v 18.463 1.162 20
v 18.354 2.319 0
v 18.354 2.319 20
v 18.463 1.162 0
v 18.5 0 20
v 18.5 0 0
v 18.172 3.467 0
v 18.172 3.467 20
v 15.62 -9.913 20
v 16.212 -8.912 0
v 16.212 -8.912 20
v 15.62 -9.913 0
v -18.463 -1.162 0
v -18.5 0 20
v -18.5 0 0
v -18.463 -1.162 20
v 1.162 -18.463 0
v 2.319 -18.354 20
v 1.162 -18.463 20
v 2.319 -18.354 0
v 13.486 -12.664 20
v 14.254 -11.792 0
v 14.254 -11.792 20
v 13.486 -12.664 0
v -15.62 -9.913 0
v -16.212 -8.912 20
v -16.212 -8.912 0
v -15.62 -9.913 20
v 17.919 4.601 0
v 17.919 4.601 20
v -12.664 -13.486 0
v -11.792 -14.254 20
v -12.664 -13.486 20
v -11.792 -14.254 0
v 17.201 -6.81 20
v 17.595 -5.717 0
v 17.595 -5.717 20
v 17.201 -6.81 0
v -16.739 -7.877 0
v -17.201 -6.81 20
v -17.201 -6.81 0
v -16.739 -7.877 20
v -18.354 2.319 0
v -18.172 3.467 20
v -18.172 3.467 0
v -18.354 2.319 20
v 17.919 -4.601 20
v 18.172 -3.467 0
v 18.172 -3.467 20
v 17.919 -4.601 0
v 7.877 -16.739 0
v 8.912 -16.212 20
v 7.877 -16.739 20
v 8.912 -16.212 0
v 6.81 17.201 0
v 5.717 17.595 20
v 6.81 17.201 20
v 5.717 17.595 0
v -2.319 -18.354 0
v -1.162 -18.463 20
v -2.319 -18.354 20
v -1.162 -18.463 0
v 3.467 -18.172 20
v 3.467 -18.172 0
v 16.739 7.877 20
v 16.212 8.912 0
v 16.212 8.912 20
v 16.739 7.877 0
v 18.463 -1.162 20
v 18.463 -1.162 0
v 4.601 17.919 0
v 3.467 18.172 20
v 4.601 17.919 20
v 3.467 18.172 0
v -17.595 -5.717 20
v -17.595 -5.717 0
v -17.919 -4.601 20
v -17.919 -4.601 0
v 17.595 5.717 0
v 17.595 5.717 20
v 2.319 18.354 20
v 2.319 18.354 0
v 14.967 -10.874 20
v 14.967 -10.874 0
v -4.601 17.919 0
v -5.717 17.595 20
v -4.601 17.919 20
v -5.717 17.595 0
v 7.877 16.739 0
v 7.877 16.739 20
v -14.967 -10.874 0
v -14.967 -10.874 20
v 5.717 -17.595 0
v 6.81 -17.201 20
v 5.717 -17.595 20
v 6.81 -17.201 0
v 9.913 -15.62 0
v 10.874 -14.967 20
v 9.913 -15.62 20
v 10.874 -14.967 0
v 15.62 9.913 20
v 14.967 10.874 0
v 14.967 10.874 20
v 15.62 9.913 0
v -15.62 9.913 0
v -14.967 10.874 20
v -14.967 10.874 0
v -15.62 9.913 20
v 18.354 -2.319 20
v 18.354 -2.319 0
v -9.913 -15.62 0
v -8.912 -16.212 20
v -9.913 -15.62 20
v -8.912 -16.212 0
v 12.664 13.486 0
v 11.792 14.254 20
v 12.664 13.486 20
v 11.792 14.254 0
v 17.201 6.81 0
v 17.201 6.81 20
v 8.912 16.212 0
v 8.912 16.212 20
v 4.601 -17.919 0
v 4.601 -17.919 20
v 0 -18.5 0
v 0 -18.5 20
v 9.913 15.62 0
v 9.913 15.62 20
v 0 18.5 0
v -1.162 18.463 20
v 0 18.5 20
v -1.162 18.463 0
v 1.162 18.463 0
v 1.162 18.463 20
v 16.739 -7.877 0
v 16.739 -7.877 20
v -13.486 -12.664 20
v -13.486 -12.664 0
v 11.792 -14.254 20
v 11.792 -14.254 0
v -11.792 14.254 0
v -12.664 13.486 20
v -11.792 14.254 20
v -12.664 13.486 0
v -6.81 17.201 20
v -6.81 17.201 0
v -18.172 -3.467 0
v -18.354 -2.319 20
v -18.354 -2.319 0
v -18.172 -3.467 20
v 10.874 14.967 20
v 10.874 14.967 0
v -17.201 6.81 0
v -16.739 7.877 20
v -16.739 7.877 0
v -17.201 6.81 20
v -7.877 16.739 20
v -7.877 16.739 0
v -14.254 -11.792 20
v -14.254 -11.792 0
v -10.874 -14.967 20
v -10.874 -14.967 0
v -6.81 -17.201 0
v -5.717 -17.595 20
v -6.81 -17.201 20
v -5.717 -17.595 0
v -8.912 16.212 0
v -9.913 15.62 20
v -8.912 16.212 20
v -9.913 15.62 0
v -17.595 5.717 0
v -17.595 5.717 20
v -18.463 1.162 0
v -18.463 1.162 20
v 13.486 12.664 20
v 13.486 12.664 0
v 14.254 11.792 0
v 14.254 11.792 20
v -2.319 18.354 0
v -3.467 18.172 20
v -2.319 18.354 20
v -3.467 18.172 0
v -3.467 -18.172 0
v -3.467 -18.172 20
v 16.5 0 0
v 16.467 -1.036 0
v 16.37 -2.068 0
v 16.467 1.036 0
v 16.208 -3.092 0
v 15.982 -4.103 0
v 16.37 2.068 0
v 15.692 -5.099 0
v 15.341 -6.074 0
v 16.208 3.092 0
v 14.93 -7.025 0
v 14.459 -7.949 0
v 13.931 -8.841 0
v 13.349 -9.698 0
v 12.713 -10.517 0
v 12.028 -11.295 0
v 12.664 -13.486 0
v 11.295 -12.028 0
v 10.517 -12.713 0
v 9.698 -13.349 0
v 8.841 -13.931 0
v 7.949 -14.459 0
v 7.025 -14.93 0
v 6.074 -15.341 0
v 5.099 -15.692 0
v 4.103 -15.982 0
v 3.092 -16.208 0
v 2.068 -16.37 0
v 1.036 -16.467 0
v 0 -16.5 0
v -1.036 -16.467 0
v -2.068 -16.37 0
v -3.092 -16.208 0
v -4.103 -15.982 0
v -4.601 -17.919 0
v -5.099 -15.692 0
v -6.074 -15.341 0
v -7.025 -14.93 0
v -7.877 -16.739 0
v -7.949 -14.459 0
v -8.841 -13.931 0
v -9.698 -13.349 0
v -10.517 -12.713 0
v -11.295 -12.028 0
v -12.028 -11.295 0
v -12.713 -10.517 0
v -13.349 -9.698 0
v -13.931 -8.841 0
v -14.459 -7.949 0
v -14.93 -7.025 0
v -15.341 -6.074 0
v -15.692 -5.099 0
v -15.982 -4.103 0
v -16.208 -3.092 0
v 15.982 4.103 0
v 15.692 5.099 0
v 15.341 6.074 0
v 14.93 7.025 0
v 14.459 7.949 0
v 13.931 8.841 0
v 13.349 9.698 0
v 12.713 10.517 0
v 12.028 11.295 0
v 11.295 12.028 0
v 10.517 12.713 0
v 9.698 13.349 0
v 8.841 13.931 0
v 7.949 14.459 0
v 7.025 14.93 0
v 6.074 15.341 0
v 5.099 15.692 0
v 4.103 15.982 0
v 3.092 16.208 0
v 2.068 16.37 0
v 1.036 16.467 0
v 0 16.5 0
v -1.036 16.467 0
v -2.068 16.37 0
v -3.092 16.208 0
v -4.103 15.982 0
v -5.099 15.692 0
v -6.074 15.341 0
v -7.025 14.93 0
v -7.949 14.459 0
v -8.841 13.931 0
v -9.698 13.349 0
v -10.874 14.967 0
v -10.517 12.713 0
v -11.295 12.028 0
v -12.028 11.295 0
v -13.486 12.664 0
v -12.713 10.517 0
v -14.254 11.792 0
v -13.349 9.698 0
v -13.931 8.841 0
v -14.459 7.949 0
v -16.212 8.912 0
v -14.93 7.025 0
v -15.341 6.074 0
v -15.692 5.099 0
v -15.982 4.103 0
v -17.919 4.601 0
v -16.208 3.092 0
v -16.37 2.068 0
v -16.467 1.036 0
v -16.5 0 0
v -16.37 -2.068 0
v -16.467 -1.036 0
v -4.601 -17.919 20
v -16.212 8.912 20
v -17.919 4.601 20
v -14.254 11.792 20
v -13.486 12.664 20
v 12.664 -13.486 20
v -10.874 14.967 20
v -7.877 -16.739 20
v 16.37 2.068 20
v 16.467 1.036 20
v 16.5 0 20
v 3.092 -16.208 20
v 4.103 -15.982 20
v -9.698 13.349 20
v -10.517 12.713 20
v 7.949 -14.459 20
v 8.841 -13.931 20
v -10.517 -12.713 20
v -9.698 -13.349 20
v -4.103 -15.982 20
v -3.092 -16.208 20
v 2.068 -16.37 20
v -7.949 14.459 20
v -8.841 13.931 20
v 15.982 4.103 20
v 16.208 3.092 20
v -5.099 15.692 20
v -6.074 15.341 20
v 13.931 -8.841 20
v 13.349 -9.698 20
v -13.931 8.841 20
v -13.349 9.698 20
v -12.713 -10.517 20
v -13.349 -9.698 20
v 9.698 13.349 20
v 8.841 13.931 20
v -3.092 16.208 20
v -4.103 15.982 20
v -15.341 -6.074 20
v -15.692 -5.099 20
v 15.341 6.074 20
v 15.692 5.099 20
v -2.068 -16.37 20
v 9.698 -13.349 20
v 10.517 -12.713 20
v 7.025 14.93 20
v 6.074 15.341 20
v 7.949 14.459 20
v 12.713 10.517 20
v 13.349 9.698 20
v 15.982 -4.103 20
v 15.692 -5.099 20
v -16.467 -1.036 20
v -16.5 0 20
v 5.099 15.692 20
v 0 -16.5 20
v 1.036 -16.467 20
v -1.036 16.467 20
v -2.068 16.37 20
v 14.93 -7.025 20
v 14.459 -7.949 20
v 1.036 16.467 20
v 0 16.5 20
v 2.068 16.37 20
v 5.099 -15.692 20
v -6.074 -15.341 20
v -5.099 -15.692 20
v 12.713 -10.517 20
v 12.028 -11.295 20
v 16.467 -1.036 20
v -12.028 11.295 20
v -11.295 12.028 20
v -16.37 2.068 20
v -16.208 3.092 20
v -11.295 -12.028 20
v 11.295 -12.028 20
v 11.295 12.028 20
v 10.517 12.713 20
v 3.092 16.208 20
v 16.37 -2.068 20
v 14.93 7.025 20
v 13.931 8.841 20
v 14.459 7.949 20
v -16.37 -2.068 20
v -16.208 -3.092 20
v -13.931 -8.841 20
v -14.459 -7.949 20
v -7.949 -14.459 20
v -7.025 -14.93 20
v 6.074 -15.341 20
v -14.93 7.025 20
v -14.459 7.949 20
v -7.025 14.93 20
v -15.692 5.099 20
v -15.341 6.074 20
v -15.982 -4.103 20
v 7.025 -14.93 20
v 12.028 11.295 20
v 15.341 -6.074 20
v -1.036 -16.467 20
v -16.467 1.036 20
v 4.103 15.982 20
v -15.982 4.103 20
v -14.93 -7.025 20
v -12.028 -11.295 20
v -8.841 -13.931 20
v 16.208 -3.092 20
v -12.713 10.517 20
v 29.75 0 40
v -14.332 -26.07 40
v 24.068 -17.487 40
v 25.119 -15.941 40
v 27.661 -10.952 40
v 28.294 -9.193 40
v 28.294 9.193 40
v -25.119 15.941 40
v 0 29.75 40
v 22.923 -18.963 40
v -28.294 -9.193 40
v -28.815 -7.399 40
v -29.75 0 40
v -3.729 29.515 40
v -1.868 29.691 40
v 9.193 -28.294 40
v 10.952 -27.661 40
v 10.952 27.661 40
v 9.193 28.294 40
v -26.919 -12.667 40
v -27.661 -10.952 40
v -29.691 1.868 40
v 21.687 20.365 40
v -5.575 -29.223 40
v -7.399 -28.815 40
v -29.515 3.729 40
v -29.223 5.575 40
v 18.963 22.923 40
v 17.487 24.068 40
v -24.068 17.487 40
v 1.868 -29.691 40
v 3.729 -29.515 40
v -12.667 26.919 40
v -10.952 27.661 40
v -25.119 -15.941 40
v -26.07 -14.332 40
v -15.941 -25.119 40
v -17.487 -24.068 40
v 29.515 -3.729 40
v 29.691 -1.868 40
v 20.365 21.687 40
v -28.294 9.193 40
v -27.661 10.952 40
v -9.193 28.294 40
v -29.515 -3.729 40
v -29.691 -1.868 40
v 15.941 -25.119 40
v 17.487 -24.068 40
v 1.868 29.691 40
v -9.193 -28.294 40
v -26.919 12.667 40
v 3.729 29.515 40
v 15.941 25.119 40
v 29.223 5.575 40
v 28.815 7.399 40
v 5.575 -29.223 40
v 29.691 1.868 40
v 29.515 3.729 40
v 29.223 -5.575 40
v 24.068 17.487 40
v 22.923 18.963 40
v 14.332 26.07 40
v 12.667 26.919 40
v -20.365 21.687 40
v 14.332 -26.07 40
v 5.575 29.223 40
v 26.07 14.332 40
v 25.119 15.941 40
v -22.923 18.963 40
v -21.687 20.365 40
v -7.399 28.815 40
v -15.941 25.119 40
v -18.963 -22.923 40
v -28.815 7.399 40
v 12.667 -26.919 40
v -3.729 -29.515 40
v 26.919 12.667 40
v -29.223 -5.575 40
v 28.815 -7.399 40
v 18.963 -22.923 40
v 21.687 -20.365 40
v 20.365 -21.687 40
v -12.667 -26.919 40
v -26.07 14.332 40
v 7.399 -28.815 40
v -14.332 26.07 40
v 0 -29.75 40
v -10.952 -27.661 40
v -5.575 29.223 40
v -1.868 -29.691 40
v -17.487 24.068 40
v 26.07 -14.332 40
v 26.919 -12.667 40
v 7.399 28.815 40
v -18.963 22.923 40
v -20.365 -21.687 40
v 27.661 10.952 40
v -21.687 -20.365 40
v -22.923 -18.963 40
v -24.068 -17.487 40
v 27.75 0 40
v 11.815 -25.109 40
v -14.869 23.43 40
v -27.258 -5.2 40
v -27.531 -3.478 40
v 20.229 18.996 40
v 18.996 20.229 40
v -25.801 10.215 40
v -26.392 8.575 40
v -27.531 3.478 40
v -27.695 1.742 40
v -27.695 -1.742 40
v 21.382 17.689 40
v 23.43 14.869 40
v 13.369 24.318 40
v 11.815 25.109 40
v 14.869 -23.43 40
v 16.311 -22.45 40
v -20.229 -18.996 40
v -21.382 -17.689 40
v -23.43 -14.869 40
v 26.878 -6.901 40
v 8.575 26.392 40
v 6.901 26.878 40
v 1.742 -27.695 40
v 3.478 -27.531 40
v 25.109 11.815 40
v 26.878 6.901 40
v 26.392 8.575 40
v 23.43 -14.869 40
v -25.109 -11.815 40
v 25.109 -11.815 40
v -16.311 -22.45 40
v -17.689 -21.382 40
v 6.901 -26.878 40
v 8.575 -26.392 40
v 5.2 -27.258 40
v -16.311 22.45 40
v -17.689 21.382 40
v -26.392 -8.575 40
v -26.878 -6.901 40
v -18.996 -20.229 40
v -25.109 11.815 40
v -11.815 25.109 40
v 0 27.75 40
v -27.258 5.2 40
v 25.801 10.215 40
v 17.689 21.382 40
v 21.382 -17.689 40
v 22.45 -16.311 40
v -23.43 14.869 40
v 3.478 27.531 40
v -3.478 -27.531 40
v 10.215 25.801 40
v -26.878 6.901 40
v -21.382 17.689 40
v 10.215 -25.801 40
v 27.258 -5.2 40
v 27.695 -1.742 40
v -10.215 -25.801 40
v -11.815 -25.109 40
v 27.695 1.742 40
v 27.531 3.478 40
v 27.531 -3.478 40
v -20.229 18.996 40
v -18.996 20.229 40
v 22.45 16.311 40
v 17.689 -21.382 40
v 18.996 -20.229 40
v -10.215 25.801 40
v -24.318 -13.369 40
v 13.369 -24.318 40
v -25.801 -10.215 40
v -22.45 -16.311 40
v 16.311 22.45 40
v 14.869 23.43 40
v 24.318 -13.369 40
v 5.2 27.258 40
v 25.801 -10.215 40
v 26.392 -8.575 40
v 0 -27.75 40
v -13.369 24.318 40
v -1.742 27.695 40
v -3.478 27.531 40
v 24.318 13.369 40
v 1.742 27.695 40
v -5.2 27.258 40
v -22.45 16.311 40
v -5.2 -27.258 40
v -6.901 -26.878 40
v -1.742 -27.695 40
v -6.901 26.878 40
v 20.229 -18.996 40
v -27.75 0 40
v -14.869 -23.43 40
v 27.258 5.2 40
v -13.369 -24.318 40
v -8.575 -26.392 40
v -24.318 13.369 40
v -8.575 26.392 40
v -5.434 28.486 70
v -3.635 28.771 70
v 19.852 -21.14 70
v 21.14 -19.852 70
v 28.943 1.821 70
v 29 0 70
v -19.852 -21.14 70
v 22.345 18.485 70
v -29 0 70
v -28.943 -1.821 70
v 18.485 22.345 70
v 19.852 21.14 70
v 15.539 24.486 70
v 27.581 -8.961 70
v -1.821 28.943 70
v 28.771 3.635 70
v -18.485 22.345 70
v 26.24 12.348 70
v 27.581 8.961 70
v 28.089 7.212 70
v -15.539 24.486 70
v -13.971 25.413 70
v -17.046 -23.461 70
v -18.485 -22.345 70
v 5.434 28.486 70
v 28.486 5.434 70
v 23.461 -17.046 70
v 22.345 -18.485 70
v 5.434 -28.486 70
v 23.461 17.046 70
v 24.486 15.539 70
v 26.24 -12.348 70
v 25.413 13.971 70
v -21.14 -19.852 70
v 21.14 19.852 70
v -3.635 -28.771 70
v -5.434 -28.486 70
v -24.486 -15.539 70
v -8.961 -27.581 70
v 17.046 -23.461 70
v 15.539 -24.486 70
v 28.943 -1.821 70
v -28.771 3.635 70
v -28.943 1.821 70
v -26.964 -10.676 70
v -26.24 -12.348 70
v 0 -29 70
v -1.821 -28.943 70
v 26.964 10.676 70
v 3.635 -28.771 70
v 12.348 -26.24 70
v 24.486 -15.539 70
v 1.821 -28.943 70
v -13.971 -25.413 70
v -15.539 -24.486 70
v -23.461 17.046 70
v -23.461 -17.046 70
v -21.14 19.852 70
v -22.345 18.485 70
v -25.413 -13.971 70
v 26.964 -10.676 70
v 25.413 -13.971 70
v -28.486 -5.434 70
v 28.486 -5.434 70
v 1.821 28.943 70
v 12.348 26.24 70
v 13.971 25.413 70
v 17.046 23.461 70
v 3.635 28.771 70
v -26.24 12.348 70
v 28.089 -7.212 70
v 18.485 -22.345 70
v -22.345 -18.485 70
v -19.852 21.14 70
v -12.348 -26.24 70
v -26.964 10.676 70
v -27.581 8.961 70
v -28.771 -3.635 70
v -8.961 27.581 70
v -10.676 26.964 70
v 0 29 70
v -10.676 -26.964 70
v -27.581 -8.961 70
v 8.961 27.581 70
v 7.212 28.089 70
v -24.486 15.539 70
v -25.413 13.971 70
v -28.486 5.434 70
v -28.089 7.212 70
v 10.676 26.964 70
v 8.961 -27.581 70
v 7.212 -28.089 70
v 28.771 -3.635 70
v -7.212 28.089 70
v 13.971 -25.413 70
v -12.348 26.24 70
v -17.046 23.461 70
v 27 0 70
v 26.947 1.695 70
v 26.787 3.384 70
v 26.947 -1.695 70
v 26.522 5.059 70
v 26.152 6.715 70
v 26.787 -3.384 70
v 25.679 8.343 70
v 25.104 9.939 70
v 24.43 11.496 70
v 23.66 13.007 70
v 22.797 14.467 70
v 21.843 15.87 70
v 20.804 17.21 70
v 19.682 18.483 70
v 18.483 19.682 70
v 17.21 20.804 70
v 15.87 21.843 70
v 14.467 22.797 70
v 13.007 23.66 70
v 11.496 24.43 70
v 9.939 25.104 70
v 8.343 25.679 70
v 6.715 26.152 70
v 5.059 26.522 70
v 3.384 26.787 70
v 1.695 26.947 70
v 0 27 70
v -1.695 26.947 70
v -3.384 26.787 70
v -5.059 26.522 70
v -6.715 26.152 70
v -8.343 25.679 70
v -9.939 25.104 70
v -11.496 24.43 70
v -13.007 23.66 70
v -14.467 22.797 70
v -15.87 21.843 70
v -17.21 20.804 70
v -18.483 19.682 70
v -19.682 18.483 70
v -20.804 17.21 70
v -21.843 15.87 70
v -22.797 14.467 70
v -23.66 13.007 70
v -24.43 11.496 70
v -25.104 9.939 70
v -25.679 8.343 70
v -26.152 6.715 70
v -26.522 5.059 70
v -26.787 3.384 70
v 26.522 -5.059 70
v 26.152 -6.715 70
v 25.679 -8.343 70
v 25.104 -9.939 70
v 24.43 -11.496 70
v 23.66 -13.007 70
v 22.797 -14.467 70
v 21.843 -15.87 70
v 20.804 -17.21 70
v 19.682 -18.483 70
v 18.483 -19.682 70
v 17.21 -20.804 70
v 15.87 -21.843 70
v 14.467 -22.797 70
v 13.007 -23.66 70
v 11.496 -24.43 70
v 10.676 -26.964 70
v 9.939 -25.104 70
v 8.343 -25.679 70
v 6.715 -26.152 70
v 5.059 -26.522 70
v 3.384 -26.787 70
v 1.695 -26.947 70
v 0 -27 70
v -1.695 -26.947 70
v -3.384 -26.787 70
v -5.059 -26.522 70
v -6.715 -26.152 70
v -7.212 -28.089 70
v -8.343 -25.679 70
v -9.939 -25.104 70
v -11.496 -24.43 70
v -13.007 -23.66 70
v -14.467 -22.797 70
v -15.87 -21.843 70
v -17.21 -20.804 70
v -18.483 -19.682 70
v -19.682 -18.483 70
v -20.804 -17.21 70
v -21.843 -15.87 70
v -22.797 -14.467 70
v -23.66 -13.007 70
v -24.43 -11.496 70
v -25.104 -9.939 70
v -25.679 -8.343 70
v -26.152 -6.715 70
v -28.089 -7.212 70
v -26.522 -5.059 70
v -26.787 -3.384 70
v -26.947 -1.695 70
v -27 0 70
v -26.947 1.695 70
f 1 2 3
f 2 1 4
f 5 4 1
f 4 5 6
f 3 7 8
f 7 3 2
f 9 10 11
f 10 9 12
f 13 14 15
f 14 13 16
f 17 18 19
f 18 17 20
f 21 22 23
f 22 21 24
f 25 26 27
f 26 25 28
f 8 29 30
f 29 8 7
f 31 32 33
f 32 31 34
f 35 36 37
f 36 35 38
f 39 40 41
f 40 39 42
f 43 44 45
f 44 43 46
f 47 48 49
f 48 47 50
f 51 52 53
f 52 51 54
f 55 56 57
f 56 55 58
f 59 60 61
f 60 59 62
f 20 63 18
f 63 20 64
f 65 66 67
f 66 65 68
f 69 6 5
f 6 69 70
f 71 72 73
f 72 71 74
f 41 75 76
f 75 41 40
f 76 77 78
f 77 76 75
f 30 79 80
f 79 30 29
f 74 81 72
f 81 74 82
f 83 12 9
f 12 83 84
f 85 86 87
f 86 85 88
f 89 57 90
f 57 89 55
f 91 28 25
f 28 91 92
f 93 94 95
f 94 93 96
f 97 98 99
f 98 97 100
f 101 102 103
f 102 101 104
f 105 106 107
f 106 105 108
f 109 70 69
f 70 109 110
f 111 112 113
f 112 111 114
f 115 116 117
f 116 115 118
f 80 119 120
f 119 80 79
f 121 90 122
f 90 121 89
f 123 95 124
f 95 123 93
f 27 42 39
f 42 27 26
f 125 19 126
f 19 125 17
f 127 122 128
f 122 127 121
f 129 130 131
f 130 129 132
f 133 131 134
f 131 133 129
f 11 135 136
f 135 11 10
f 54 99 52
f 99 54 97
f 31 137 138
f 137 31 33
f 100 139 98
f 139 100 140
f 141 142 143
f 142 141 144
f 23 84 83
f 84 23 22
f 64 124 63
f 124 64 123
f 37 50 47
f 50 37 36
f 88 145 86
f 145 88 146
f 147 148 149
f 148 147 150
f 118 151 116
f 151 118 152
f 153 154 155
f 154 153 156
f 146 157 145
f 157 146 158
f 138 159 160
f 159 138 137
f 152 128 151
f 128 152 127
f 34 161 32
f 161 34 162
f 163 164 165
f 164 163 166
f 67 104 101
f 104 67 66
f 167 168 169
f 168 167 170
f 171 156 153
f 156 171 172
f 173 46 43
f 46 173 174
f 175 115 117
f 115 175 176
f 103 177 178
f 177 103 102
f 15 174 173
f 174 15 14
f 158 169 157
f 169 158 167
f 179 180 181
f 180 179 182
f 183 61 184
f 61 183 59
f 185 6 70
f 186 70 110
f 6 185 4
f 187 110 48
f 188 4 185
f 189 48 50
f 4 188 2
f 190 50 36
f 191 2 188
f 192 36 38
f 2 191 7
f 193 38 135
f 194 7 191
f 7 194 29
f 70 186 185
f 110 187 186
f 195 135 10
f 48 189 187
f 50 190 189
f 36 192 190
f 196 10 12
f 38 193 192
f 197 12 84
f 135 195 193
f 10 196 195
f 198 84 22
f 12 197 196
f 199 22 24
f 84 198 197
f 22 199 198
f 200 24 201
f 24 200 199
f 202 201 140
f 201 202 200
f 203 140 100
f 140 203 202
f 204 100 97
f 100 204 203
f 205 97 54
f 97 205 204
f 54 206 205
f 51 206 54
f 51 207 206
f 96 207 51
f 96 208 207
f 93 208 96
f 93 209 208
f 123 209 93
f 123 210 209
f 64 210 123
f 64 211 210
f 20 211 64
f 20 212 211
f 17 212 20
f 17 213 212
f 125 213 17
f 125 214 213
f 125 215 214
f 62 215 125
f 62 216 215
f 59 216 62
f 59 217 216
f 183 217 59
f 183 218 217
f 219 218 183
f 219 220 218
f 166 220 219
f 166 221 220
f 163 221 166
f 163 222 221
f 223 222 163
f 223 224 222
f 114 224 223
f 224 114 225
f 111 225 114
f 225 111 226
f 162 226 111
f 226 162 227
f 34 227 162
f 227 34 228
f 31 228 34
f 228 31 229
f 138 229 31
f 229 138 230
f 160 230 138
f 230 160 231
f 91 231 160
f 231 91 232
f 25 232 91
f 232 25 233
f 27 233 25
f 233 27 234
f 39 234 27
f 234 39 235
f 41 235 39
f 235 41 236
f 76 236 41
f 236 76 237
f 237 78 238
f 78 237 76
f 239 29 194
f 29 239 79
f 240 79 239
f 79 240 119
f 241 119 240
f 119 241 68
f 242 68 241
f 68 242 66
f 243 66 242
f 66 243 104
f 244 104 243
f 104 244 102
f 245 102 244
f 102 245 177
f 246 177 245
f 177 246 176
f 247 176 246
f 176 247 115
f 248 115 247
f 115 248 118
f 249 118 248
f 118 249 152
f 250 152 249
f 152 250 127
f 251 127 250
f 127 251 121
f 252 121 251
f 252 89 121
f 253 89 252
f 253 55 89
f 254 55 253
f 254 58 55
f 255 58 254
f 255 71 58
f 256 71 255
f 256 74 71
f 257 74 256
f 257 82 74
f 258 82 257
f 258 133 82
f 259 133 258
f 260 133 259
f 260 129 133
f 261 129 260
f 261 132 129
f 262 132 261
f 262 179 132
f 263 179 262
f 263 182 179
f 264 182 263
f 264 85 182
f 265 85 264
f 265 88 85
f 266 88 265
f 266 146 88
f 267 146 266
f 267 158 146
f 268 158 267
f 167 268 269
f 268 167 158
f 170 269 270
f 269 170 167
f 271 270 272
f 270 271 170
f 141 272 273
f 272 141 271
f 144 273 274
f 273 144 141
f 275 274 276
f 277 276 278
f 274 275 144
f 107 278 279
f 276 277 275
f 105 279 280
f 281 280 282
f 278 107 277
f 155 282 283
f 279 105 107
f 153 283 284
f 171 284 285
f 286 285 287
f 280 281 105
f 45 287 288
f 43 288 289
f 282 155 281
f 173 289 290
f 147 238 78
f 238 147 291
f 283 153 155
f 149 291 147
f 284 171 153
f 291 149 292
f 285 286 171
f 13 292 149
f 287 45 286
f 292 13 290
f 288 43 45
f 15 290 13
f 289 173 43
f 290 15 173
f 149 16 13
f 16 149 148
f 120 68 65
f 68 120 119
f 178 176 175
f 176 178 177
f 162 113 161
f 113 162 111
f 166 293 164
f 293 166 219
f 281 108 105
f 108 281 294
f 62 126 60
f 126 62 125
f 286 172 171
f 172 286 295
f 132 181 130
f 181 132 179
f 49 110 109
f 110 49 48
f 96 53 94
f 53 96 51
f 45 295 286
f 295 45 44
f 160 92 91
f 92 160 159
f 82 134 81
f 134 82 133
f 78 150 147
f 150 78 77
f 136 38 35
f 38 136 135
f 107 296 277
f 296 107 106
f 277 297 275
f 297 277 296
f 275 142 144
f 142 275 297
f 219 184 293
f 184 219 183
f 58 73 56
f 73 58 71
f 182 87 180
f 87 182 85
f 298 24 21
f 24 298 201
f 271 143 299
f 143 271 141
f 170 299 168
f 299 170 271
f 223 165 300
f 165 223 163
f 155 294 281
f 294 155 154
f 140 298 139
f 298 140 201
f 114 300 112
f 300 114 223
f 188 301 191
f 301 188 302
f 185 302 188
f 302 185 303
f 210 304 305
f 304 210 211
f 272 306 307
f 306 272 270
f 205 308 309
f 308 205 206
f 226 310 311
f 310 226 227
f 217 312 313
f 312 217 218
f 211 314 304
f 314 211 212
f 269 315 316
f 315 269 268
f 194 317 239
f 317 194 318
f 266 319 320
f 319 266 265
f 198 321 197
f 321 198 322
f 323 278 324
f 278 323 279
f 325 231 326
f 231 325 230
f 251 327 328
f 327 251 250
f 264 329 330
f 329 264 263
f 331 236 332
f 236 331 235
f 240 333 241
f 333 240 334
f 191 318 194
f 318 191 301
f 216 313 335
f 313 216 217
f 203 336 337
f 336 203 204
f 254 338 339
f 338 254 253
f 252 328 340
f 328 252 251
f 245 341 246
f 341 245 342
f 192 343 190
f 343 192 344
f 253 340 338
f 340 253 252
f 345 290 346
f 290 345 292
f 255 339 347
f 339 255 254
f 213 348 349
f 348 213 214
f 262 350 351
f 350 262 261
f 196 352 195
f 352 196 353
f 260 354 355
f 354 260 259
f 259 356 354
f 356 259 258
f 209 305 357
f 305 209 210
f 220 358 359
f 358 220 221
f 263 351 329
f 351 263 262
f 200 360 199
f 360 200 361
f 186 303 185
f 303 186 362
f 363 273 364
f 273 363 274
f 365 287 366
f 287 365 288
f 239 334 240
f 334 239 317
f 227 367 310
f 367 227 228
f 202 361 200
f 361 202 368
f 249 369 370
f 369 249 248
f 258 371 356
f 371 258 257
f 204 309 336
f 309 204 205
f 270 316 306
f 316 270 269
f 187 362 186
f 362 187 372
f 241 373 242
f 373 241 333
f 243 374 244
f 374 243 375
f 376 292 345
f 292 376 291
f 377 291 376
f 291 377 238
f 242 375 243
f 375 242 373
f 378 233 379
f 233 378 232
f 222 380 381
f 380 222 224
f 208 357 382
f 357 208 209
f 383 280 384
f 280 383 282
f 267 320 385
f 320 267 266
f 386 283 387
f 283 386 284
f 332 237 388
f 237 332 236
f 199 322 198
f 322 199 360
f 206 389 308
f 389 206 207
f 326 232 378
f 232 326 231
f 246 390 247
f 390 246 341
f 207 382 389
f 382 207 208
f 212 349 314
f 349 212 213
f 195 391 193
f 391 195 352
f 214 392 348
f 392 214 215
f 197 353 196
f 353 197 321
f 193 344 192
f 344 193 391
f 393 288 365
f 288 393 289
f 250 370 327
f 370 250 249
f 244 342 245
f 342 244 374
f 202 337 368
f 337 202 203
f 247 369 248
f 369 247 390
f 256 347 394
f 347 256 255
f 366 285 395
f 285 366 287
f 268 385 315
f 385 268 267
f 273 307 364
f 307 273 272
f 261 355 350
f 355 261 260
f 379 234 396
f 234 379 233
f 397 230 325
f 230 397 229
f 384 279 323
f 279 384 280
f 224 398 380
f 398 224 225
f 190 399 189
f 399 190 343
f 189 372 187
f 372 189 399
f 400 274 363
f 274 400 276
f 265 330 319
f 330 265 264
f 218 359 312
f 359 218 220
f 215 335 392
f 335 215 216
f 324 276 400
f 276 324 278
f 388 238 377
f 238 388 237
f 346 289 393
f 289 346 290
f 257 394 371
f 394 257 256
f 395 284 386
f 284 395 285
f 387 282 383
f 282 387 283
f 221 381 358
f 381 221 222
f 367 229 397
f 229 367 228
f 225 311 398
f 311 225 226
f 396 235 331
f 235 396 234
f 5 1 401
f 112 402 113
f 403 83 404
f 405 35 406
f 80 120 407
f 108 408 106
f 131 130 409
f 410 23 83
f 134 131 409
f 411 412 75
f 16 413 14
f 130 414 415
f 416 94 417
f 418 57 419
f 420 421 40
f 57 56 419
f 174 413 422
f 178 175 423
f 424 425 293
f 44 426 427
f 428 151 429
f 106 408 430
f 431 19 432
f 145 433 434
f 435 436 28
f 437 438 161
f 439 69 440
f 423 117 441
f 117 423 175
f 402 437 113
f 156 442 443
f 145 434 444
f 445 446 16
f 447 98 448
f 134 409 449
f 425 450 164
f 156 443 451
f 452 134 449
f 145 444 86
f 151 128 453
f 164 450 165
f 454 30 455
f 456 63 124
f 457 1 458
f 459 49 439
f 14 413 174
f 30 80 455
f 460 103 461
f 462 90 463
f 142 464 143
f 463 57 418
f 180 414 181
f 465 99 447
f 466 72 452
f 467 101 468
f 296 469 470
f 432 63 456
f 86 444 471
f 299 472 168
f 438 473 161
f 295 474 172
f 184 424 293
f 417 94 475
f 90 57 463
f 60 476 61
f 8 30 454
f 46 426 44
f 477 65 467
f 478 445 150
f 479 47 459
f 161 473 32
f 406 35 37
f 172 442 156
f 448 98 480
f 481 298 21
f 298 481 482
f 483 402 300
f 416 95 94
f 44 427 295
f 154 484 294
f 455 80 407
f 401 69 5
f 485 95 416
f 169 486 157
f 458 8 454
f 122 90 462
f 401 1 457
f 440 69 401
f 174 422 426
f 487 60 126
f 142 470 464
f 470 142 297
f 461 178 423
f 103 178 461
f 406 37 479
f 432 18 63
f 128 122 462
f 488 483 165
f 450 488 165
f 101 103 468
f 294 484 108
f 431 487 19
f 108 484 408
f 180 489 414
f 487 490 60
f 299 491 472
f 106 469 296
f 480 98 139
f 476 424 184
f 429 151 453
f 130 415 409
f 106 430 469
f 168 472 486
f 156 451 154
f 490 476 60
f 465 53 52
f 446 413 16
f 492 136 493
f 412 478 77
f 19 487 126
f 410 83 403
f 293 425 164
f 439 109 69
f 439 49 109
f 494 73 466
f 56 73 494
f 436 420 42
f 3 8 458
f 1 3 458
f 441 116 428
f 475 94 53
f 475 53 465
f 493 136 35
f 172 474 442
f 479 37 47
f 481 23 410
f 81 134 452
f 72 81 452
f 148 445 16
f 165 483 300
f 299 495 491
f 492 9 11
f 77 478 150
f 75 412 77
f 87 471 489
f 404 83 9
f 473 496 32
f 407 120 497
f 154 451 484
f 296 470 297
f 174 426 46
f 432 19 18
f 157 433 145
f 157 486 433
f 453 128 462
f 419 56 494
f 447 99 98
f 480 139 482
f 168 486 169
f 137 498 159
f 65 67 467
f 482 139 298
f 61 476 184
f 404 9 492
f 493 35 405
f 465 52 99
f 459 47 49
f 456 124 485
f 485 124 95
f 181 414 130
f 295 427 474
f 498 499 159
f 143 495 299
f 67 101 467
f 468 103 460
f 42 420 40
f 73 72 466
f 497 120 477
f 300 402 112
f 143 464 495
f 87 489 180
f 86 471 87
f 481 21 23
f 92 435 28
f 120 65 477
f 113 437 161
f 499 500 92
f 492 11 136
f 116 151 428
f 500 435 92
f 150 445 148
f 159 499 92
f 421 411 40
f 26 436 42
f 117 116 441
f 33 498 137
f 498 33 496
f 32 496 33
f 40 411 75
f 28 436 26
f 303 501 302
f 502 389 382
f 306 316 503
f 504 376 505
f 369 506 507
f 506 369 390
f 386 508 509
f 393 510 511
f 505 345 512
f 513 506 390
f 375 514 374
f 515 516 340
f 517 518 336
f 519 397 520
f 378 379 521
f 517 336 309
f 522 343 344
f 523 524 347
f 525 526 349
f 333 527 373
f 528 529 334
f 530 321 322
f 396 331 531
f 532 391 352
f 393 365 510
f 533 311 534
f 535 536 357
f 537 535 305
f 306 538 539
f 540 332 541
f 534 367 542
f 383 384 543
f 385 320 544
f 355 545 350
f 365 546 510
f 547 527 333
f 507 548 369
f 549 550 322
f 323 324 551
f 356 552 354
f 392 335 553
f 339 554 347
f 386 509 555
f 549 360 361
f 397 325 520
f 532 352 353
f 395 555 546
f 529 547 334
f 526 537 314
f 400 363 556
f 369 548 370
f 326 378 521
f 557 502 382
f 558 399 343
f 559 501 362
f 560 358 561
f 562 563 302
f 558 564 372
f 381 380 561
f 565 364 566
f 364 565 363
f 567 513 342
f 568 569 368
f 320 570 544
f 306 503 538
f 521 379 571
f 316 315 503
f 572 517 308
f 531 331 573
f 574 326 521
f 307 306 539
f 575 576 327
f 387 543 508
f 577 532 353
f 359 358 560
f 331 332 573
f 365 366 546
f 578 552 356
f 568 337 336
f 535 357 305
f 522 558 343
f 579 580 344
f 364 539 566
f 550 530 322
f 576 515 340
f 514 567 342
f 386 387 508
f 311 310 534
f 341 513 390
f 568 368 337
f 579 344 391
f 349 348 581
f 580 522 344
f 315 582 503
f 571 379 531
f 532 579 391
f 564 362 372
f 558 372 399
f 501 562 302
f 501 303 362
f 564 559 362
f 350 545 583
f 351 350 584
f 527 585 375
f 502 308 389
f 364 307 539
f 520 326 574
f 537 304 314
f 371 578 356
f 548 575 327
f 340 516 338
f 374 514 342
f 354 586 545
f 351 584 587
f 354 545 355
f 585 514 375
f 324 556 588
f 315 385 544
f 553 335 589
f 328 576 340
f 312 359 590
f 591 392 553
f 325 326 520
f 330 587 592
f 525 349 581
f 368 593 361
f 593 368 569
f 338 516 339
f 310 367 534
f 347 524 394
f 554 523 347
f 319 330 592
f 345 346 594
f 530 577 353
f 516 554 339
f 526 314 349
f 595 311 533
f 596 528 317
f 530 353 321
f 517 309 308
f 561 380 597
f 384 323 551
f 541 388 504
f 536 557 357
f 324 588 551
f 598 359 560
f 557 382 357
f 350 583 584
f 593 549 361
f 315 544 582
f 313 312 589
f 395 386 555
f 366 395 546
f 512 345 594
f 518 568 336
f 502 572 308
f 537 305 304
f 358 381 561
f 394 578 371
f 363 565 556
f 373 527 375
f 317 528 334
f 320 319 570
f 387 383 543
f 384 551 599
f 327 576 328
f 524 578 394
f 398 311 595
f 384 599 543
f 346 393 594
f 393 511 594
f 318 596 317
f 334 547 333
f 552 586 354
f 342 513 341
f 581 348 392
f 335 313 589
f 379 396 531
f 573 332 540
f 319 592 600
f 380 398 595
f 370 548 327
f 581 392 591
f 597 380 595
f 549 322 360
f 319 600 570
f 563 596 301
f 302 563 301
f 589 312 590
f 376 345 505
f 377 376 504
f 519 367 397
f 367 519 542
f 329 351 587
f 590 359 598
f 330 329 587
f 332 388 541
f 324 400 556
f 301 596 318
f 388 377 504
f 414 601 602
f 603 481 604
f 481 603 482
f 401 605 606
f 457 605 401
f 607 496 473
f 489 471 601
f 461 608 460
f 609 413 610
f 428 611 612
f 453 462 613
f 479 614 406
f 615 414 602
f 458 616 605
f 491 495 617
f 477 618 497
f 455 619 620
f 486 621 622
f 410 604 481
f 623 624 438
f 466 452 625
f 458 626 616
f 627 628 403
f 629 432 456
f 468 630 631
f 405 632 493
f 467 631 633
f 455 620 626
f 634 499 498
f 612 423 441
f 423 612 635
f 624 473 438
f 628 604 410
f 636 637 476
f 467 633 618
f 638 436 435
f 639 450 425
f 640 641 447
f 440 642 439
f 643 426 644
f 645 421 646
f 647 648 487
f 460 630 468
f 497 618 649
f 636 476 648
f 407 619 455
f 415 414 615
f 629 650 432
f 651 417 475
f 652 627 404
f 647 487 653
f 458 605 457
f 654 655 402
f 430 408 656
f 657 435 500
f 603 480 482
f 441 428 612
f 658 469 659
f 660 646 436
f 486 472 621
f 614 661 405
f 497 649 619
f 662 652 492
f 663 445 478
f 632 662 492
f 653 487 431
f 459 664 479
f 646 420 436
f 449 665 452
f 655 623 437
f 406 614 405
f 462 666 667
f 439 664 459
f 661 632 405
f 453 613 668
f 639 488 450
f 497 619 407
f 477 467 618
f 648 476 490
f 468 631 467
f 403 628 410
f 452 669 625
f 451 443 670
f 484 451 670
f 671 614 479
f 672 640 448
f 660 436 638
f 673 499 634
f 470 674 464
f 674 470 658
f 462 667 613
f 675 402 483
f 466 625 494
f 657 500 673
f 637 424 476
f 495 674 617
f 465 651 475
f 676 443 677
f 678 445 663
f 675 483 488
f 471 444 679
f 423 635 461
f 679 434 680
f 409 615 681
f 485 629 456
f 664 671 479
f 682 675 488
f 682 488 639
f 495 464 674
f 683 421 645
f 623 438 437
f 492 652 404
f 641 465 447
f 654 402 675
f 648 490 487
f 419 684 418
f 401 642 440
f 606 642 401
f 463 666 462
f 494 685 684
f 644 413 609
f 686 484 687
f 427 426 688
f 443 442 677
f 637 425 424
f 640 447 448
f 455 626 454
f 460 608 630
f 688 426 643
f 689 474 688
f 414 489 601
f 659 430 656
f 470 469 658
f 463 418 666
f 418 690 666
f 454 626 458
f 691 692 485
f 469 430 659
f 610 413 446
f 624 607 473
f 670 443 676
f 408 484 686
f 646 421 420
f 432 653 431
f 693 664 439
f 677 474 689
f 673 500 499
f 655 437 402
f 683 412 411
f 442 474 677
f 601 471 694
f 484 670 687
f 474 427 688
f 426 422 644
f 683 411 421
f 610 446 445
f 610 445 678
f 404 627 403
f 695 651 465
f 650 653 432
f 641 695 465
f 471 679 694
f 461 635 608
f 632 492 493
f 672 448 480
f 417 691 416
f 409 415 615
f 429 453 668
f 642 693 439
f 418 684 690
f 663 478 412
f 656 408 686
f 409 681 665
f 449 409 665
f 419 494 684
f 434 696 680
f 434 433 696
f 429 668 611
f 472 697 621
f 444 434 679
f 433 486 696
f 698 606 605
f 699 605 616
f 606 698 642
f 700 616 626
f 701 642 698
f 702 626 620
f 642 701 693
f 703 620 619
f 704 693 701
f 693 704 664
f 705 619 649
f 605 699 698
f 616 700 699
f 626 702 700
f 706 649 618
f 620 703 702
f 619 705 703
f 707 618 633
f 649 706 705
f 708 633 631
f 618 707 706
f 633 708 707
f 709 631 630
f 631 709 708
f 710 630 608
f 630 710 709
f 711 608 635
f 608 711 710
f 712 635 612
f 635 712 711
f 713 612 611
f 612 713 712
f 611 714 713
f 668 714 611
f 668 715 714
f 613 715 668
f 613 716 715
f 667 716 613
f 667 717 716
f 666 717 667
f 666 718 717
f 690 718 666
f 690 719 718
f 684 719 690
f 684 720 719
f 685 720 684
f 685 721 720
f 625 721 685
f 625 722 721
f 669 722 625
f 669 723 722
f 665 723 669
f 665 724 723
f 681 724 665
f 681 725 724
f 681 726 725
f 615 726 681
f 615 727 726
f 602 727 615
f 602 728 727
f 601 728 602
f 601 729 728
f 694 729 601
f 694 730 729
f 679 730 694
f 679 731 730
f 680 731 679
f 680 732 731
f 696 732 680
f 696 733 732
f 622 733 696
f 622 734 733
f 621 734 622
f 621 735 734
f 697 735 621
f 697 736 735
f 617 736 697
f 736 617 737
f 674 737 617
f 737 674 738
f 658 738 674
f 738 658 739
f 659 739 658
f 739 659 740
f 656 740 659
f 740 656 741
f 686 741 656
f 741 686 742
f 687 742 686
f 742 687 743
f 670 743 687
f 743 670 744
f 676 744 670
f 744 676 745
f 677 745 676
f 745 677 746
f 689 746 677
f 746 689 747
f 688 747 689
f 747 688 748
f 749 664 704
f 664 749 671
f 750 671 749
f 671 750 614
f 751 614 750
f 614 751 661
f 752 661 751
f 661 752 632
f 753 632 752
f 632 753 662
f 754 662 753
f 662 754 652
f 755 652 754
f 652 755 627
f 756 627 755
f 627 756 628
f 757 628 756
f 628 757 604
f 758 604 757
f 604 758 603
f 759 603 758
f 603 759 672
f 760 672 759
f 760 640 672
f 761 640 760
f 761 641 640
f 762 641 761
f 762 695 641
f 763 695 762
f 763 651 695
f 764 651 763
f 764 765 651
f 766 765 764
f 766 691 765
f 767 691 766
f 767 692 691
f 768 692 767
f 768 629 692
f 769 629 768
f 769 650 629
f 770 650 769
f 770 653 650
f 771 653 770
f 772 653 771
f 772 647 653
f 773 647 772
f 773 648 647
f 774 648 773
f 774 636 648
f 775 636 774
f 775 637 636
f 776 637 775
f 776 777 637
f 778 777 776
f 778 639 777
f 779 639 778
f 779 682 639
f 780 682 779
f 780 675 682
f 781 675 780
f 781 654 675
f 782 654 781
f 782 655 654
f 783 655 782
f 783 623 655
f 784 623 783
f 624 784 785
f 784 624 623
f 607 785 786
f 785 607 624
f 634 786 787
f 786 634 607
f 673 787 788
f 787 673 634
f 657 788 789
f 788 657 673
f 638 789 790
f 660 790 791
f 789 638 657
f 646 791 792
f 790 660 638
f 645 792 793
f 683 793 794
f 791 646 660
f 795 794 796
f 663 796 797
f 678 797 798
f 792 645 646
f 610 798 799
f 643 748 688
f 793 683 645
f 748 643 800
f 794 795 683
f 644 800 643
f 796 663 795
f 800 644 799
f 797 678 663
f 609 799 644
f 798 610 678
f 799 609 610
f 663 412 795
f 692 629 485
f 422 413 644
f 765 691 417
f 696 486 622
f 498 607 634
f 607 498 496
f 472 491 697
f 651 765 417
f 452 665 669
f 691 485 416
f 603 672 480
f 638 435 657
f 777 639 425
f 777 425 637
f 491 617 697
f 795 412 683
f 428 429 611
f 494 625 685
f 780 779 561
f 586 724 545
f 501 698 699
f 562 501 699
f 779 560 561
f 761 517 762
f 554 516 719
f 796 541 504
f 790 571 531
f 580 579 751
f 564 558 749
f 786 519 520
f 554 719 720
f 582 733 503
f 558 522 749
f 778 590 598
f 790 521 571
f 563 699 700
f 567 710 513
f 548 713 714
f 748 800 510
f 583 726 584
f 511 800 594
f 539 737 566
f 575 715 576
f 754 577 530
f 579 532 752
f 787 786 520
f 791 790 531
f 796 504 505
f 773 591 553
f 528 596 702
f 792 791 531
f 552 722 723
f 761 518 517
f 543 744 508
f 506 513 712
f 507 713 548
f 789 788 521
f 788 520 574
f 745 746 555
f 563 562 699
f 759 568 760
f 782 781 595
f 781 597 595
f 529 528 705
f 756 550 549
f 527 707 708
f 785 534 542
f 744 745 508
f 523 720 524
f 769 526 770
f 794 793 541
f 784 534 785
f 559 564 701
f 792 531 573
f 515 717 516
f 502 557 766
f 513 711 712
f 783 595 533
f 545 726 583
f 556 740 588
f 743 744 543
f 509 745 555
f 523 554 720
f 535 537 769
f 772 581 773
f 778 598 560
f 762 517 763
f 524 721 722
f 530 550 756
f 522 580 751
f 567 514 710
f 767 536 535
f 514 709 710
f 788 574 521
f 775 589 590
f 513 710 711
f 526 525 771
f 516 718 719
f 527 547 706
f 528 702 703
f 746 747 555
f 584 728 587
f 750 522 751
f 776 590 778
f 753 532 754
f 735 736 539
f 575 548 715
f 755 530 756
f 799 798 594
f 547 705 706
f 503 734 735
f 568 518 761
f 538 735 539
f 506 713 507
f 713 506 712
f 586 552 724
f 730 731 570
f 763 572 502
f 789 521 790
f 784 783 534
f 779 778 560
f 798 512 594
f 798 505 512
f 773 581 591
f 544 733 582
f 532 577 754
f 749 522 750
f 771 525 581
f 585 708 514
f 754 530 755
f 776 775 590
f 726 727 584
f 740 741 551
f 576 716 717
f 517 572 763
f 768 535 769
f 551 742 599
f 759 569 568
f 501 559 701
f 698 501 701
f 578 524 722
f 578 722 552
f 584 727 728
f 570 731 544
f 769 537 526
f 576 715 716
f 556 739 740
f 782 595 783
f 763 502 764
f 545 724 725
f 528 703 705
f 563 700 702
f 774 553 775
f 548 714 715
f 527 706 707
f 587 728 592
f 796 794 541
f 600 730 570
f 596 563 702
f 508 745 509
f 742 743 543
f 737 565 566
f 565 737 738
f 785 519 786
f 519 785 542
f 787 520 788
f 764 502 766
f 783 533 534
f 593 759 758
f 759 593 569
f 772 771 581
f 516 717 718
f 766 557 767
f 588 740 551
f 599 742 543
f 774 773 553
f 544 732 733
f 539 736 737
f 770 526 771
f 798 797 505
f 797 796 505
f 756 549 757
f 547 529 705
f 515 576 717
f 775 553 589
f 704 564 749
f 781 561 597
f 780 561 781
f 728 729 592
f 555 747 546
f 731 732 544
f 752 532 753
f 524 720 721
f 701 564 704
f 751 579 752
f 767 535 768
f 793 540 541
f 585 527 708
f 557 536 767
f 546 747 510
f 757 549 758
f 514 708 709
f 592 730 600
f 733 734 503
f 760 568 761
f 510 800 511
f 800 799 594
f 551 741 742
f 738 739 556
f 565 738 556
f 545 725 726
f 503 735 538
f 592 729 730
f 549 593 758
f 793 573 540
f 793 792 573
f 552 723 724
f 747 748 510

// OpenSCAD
// !! taper end

$fn=100;
wall_thickness = 2;
section_length = 20;
end_taper = 1.5;

start_int_dia = 33;
start_ext_dia = start_int_dia + 2 * wall_thickness;
end_ext_dia = 59.5;
end_int_dia = end_ext_dia - 2 * wall_thickness;


module start_tube() {
    difference() {
        cylinder(section_length, d = start_ext_dia);
        cylinder(section_length, d = start_int_dia);
    }
}

module middle_tube() {
    difference() {
        cylinder(section_length, d1 = start_ext_dia, d2 = end_ext_dia);
        cylinder(section_length, d1 = start_int_dia, d2 = end_int_dia);
    }
}

module end_tube() {
    difference() {
        cylinder(section_length*1.5, d1 = end_ext_dia, d2 = end_ext_dia-end_taper);
        cylinder(section_length*1.5, d1 = end_int_dia, d2 = end_int_dia-end_taper);
    }
}

module adaptor() {
    start_tube();
    translate([0, 0, section_length]) middle_tube();
    translate([0, 0, section_length*2]) end_tube();    
}


adaptor();
    
    
